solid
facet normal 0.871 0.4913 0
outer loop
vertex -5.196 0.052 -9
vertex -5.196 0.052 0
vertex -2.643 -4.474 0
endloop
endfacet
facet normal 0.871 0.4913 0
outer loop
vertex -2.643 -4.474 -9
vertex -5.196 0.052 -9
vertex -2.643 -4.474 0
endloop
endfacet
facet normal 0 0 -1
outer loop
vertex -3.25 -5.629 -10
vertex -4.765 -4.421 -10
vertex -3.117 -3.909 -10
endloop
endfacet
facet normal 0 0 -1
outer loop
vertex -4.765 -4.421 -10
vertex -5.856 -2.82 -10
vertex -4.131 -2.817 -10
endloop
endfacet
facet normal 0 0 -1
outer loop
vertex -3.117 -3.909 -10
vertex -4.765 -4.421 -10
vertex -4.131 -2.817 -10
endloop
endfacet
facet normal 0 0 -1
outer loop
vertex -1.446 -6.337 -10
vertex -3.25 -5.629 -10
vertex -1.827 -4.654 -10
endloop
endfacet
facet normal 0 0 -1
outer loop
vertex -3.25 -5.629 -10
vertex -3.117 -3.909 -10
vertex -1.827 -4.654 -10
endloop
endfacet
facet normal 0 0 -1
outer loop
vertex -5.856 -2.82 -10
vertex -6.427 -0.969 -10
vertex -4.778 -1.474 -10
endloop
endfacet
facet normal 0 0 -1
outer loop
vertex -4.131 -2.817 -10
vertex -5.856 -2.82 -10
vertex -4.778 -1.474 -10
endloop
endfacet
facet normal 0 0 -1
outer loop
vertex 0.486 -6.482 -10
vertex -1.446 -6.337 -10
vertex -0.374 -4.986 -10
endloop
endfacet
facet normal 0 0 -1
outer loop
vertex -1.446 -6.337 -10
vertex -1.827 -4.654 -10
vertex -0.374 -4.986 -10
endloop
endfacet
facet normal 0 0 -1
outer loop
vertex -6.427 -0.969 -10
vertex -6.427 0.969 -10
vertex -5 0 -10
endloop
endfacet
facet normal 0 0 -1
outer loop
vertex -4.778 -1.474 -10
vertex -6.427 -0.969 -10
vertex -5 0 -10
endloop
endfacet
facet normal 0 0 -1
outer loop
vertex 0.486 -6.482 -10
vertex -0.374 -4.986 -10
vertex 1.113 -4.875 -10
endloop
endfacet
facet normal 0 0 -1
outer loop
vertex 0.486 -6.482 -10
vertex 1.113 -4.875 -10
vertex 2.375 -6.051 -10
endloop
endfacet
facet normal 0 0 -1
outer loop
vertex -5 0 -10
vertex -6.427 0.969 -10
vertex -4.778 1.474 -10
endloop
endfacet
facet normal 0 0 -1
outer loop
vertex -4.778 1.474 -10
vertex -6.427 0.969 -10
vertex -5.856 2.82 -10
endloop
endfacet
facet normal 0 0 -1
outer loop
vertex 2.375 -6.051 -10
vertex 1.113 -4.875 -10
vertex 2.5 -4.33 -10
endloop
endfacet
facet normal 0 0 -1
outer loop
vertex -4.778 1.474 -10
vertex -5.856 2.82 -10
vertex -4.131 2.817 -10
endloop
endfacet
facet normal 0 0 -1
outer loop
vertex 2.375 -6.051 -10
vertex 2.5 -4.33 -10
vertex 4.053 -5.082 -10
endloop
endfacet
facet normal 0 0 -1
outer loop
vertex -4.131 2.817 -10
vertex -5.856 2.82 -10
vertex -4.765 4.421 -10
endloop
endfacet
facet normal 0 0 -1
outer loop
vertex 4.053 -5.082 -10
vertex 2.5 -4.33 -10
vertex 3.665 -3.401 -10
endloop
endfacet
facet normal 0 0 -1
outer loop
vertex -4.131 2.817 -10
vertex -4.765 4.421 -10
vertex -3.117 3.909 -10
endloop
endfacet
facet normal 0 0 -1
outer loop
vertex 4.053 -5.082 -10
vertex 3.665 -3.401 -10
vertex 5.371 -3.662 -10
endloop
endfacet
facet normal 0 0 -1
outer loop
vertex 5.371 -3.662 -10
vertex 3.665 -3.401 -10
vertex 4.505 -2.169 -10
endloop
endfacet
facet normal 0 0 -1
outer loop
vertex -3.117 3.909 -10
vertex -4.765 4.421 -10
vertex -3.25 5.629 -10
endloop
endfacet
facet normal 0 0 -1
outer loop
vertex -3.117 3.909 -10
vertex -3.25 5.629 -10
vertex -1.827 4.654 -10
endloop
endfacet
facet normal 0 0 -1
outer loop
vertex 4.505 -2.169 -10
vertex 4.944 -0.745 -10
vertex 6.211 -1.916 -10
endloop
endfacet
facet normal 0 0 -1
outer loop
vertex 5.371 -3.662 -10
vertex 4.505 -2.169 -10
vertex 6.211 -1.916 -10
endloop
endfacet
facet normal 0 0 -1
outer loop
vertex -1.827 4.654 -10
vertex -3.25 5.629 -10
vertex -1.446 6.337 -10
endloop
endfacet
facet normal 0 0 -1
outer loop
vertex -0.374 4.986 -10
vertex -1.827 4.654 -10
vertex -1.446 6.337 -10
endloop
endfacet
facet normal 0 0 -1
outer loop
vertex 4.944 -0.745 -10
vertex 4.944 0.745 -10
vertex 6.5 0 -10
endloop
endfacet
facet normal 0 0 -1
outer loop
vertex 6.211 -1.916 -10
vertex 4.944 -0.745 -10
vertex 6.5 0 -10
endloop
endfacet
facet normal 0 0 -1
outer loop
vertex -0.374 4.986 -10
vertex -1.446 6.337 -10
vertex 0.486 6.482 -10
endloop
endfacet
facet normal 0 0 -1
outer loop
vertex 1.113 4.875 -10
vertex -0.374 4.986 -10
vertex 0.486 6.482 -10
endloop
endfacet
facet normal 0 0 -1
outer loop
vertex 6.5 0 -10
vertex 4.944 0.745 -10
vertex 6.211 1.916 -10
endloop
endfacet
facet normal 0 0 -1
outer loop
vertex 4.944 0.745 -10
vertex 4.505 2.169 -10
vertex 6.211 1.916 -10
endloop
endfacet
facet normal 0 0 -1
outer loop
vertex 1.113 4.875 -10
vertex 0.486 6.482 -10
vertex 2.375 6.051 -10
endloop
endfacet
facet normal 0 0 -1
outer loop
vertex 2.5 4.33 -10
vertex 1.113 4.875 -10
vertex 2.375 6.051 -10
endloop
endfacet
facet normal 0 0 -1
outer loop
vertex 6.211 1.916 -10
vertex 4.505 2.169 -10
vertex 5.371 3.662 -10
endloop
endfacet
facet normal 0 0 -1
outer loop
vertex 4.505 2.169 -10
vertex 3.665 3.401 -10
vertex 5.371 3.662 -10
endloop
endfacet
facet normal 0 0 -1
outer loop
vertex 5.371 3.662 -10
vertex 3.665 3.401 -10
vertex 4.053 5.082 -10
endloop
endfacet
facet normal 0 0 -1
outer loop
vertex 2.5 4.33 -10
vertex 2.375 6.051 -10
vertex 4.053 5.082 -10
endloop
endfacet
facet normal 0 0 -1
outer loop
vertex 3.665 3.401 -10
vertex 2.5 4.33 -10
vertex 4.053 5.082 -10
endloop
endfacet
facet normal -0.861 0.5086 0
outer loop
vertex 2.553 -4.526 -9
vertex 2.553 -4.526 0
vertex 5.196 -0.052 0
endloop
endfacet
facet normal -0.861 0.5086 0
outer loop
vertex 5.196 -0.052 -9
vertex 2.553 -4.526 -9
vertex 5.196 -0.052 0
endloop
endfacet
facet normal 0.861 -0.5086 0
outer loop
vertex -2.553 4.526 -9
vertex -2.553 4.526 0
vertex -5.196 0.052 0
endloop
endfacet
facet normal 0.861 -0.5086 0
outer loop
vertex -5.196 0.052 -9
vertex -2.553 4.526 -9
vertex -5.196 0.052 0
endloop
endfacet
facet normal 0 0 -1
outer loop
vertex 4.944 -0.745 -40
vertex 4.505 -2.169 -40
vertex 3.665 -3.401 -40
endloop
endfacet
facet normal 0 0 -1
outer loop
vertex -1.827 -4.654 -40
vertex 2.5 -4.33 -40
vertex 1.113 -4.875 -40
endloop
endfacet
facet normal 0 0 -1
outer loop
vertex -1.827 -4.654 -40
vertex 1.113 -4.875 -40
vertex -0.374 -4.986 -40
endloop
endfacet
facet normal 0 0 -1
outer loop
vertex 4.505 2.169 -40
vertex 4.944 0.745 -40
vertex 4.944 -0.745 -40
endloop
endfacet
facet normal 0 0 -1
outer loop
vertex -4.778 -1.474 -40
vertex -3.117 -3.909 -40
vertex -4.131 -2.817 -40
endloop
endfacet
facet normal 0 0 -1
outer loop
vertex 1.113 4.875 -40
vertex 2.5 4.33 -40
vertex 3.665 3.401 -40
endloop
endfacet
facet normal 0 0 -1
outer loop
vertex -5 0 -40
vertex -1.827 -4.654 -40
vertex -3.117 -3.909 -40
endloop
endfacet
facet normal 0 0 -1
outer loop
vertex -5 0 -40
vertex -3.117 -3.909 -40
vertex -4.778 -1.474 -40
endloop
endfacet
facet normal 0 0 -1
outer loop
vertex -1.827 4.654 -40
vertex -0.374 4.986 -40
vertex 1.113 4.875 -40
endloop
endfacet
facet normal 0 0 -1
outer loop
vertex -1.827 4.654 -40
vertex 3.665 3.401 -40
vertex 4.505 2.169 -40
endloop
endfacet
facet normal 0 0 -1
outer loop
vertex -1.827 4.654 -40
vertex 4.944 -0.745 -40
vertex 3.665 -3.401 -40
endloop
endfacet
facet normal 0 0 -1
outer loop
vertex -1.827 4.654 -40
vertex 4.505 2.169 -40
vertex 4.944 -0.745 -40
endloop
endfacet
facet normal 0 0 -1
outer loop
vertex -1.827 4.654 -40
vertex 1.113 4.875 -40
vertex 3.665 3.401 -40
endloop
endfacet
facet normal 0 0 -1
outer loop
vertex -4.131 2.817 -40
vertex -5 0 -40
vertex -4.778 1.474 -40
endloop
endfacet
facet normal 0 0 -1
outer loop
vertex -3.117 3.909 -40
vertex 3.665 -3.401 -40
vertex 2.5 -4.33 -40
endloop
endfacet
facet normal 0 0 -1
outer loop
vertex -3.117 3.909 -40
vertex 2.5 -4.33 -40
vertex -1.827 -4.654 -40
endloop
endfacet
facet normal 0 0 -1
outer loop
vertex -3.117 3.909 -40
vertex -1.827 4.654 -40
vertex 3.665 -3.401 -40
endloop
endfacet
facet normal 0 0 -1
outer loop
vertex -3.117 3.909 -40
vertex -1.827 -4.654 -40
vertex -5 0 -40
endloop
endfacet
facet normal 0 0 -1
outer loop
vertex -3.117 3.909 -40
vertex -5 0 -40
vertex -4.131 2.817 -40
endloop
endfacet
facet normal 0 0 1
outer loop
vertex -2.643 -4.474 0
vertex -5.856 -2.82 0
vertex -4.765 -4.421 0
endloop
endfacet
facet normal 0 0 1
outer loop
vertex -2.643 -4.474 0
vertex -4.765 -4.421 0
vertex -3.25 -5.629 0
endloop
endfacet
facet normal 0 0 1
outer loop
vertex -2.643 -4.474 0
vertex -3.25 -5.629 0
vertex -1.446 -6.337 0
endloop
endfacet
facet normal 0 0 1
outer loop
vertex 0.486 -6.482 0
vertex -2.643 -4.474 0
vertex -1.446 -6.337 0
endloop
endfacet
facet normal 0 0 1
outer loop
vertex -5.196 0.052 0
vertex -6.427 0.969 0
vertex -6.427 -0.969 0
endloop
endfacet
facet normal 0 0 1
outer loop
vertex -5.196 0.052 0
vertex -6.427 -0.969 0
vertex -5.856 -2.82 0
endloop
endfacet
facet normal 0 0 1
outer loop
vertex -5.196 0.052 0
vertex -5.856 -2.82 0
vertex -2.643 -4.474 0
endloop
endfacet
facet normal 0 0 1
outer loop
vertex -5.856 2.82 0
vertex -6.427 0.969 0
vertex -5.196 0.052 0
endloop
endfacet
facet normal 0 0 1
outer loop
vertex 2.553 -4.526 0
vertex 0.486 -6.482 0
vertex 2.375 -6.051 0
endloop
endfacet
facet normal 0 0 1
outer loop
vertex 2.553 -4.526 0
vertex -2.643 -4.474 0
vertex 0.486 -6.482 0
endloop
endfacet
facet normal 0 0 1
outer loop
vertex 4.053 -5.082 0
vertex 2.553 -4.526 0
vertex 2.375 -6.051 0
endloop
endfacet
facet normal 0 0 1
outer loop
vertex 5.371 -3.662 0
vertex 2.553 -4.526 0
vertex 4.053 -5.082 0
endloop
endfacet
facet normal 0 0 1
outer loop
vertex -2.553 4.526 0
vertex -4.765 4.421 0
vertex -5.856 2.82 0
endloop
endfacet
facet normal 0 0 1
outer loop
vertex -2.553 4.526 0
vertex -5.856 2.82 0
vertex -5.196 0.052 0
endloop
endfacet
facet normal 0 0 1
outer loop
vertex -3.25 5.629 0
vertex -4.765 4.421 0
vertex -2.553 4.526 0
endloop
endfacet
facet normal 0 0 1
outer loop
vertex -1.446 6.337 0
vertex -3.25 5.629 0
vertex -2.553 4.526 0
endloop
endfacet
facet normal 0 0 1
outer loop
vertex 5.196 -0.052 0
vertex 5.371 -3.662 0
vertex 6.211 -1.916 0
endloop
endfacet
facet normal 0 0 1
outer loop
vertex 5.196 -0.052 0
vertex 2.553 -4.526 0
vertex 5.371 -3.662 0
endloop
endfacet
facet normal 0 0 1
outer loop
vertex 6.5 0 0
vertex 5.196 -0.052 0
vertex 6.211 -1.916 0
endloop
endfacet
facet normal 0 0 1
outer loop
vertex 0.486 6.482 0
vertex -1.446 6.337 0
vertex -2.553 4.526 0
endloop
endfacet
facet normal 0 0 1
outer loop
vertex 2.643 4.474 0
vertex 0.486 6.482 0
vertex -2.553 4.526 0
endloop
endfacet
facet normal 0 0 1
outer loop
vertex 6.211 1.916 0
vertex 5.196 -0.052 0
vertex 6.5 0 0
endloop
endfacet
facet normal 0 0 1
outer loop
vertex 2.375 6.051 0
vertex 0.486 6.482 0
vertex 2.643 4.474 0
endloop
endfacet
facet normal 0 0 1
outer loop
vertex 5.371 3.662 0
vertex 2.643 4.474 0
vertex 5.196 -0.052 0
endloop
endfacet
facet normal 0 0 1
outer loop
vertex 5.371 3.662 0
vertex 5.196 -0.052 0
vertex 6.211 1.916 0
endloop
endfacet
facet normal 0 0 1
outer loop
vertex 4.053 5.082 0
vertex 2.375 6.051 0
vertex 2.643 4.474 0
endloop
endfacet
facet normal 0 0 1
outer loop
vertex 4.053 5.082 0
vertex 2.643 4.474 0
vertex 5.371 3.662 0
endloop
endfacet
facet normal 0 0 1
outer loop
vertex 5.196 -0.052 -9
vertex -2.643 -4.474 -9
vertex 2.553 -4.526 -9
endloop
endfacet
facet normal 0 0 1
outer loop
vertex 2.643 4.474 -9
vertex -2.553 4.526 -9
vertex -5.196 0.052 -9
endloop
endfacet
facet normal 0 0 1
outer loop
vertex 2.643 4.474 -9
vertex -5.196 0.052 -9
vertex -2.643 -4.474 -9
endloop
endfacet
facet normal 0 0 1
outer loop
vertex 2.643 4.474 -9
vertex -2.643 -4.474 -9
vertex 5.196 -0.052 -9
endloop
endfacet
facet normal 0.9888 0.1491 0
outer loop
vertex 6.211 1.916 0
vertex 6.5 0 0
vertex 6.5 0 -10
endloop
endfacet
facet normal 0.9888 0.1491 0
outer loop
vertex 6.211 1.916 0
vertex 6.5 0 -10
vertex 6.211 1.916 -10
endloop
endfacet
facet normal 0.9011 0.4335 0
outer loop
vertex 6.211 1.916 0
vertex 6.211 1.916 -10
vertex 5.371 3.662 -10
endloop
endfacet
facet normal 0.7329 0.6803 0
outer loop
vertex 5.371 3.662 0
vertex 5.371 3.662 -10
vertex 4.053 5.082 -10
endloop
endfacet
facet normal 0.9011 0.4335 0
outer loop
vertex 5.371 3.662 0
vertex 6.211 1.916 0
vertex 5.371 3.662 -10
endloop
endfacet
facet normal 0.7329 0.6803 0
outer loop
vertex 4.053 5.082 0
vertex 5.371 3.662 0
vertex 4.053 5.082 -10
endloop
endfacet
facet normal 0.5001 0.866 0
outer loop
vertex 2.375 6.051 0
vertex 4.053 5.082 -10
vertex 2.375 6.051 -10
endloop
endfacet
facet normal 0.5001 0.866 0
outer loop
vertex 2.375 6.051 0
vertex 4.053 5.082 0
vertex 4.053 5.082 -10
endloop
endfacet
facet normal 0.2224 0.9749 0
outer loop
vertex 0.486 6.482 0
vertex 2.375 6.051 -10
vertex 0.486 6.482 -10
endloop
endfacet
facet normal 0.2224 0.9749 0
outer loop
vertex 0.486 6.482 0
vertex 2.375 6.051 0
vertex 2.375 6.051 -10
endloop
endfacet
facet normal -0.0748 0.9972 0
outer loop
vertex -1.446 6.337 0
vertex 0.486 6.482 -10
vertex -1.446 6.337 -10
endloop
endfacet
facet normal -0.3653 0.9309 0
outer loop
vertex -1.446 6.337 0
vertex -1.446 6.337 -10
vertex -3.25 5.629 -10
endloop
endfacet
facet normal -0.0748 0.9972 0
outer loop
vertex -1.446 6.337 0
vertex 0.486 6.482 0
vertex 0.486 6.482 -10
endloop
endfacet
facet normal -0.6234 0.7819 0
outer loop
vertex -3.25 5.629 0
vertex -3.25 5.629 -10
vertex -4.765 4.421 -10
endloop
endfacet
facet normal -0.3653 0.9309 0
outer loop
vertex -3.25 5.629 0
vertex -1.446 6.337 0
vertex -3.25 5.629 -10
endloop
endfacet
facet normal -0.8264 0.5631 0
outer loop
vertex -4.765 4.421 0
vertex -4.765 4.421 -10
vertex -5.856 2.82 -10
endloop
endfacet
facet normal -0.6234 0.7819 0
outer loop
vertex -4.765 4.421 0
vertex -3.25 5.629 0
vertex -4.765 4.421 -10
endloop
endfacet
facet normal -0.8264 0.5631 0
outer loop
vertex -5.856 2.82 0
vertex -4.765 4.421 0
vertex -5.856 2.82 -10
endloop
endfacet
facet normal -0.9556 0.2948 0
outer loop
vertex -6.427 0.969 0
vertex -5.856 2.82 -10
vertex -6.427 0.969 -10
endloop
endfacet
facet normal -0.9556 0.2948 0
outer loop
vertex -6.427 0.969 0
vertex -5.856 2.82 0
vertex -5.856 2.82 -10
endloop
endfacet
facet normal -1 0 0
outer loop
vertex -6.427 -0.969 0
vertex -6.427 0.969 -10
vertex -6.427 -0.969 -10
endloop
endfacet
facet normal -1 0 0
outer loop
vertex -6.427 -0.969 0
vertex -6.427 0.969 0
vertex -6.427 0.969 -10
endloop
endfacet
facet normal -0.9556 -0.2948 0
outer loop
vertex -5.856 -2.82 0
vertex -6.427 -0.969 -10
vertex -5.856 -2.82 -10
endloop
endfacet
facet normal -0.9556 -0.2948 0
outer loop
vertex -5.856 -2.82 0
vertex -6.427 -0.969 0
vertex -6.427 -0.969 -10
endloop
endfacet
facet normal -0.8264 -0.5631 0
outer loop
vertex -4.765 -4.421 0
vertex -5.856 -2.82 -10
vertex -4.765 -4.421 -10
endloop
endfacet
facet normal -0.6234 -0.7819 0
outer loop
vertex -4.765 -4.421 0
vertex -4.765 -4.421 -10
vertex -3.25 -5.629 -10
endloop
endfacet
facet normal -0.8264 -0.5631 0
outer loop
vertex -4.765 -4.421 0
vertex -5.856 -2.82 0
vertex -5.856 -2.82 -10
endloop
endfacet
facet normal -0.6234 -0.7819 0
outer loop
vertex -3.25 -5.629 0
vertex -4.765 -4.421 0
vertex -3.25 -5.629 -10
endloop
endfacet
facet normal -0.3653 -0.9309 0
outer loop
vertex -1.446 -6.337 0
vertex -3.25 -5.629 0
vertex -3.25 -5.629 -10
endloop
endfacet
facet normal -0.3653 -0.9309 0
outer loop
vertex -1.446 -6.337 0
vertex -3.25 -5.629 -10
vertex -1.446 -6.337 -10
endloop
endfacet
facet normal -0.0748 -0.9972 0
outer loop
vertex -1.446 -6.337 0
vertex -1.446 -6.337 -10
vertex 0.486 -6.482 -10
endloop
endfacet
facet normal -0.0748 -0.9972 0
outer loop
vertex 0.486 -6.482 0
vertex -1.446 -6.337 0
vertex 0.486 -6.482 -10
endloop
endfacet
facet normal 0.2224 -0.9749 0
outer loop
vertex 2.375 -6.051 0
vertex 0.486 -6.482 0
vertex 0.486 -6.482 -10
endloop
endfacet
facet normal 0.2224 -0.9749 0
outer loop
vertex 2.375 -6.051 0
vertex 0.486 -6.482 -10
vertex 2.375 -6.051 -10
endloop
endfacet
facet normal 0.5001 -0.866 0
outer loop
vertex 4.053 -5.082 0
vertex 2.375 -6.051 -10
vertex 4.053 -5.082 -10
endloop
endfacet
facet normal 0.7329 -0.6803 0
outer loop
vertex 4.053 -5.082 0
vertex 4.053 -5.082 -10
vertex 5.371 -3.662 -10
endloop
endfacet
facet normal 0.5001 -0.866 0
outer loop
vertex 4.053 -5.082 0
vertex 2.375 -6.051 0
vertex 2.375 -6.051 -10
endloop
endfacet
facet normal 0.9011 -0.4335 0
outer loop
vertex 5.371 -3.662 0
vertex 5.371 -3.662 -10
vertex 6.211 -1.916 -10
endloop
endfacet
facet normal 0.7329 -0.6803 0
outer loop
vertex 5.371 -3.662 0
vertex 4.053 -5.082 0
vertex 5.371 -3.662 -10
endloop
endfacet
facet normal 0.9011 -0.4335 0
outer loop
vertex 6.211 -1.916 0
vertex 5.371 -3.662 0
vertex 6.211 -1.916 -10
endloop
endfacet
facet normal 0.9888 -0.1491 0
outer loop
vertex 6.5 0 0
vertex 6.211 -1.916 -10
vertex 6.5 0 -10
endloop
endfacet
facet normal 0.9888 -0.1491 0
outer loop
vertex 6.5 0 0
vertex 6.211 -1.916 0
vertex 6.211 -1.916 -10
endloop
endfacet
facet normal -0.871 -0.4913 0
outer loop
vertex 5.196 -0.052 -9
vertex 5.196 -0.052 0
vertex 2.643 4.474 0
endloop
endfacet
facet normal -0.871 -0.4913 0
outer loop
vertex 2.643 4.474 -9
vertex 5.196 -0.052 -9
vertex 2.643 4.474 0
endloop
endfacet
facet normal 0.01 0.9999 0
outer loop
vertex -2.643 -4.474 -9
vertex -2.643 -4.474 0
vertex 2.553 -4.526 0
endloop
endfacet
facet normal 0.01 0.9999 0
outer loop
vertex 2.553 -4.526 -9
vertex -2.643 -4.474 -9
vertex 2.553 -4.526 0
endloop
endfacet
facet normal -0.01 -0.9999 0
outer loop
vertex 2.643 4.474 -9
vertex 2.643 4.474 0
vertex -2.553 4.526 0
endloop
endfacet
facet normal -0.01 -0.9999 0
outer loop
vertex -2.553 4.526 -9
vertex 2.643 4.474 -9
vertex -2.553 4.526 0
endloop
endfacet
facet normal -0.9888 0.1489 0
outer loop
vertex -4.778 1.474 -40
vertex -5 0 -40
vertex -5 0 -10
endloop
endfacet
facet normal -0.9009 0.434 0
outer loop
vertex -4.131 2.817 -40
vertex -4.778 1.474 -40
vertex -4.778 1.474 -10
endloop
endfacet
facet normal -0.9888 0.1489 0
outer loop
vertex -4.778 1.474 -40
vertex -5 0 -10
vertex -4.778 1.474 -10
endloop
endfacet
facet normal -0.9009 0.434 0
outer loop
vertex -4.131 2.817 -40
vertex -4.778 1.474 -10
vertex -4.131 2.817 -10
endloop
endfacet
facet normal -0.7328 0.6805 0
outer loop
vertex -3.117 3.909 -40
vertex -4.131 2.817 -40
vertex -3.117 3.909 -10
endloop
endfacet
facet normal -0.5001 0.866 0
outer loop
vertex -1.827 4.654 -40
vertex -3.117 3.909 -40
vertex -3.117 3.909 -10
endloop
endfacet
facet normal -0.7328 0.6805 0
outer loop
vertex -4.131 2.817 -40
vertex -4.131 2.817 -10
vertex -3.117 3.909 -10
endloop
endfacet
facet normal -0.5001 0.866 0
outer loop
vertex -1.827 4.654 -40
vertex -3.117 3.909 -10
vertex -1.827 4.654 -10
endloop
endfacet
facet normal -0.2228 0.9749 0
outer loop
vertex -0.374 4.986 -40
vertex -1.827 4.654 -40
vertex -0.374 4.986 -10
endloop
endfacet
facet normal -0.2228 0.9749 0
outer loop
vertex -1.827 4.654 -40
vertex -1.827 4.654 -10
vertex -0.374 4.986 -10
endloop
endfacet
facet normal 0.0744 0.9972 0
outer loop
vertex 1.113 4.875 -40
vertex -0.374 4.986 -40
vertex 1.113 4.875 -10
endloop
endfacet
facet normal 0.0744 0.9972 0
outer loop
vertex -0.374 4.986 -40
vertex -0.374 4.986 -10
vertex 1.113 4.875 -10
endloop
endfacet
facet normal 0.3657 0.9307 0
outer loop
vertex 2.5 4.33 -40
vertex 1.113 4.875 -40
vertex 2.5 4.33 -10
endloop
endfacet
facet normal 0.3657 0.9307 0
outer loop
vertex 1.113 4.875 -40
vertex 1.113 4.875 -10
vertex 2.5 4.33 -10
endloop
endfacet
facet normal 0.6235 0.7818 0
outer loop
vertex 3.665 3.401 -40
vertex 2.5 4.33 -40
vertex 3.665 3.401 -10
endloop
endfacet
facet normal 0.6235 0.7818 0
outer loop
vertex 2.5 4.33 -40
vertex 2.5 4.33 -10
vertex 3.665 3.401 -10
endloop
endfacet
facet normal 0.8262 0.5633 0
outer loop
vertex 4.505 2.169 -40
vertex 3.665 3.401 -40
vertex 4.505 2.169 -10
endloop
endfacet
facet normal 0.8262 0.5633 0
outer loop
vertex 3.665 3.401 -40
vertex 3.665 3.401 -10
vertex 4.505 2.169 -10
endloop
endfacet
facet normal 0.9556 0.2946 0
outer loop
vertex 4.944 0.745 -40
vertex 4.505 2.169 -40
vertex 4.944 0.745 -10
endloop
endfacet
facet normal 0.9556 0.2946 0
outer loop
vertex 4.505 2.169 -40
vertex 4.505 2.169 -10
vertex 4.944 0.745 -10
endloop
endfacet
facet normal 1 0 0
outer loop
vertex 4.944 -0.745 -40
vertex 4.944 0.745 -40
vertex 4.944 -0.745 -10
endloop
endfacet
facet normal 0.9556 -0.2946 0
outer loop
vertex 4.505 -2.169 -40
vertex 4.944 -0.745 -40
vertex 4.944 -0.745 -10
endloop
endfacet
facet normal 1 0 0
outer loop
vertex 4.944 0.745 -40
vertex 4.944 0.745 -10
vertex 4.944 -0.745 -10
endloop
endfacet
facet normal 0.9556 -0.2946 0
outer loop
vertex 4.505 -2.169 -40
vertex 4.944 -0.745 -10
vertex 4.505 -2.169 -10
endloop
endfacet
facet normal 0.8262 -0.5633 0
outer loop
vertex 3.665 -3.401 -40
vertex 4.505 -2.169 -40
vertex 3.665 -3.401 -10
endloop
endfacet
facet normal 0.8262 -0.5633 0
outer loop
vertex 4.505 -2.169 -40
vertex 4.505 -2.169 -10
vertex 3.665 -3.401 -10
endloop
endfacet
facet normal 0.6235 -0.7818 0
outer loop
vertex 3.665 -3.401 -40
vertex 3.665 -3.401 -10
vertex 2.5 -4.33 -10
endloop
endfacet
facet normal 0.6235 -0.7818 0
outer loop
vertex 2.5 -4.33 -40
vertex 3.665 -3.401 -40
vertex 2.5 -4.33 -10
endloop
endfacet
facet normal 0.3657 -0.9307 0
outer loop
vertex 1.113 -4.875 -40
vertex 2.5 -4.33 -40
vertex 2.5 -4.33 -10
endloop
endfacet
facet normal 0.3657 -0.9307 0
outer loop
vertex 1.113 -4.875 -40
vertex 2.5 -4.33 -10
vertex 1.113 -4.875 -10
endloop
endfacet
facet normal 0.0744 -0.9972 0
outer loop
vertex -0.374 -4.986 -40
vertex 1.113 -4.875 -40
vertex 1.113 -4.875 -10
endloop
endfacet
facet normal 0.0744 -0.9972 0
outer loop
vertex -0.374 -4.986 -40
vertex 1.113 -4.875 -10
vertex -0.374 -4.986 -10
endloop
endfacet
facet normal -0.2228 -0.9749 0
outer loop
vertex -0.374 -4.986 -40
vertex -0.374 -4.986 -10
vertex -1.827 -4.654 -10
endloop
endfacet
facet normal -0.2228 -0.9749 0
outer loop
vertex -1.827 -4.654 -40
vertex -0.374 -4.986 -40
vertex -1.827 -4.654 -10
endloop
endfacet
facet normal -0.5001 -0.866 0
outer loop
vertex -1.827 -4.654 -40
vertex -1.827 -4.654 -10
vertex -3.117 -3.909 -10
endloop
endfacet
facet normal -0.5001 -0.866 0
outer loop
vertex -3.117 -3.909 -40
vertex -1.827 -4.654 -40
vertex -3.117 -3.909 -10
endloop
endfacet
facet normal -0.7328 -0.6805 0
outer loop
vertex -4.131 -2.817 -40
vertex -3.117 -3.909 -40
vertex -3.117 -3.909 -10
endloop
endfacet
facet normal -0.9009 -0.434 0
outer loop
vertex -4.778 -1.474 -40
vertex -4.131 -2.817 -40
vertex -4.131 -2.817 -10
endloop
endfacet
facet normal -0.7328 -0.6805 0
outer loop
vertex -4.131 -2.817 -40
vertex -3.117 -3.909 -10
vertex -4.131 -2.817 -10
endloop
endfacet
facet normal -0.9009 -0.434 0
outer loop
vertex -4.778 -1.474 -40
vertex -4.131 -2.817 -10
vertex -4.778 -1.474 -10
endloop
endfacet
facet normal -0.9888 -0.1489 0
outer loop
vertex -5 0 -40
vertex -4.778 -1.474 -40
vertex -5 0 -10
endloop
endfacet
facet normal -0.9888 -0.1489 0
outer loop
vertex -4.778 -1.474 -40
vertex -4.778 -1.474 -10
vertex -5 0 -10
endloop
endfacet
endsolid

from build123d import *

# Parameters (mm, degrees)
SKETCH1_R           = 6.5
BOSS_EXTRUDE1_DEPTH = 10
SKETCH2_R           = 5
BOSS_EXTRUDE2_DEPTH = 30
CUT_EXTRUDE1_DEPTH  = 9


with BuildPart() as part:
    # Sketch1 → Boss-Extrude1 (new body)
    with BuildSketch(Plane.XY):
        Circle(SKETCH1_R)
    extrude(amount=-BOSS_EXTRUDE1_DEPTH)

    # Sketch2 → Boss-Extrude2 (add)
    with BuildSketch(Plane(origin=(0, 0, -10), x_dir=(-1, 0, 0), z_dir=(0, 0, -1))):
        Circle(SKETCH2_R)
    extrude(amount=BOSS_EXTRUDE2_DEPTH)

    # Sketch3 → Cut-Extrude1 (cut)
    with BuildSketch(Plane.XY):
        Polygon((-2.552781944, 4.525848467), (-5.195890718, 0.052150219), (-2.643108774, -4.473698247), (2.552781944, -4.525848467), (5.195890718, -0.052150219), (2.643108774, 4.473698247), align=None)
    extrude(amount=-CUT_EXTRUDE1_DEPTH, mode=Mode.SUBTRACT)


solid = part.part
